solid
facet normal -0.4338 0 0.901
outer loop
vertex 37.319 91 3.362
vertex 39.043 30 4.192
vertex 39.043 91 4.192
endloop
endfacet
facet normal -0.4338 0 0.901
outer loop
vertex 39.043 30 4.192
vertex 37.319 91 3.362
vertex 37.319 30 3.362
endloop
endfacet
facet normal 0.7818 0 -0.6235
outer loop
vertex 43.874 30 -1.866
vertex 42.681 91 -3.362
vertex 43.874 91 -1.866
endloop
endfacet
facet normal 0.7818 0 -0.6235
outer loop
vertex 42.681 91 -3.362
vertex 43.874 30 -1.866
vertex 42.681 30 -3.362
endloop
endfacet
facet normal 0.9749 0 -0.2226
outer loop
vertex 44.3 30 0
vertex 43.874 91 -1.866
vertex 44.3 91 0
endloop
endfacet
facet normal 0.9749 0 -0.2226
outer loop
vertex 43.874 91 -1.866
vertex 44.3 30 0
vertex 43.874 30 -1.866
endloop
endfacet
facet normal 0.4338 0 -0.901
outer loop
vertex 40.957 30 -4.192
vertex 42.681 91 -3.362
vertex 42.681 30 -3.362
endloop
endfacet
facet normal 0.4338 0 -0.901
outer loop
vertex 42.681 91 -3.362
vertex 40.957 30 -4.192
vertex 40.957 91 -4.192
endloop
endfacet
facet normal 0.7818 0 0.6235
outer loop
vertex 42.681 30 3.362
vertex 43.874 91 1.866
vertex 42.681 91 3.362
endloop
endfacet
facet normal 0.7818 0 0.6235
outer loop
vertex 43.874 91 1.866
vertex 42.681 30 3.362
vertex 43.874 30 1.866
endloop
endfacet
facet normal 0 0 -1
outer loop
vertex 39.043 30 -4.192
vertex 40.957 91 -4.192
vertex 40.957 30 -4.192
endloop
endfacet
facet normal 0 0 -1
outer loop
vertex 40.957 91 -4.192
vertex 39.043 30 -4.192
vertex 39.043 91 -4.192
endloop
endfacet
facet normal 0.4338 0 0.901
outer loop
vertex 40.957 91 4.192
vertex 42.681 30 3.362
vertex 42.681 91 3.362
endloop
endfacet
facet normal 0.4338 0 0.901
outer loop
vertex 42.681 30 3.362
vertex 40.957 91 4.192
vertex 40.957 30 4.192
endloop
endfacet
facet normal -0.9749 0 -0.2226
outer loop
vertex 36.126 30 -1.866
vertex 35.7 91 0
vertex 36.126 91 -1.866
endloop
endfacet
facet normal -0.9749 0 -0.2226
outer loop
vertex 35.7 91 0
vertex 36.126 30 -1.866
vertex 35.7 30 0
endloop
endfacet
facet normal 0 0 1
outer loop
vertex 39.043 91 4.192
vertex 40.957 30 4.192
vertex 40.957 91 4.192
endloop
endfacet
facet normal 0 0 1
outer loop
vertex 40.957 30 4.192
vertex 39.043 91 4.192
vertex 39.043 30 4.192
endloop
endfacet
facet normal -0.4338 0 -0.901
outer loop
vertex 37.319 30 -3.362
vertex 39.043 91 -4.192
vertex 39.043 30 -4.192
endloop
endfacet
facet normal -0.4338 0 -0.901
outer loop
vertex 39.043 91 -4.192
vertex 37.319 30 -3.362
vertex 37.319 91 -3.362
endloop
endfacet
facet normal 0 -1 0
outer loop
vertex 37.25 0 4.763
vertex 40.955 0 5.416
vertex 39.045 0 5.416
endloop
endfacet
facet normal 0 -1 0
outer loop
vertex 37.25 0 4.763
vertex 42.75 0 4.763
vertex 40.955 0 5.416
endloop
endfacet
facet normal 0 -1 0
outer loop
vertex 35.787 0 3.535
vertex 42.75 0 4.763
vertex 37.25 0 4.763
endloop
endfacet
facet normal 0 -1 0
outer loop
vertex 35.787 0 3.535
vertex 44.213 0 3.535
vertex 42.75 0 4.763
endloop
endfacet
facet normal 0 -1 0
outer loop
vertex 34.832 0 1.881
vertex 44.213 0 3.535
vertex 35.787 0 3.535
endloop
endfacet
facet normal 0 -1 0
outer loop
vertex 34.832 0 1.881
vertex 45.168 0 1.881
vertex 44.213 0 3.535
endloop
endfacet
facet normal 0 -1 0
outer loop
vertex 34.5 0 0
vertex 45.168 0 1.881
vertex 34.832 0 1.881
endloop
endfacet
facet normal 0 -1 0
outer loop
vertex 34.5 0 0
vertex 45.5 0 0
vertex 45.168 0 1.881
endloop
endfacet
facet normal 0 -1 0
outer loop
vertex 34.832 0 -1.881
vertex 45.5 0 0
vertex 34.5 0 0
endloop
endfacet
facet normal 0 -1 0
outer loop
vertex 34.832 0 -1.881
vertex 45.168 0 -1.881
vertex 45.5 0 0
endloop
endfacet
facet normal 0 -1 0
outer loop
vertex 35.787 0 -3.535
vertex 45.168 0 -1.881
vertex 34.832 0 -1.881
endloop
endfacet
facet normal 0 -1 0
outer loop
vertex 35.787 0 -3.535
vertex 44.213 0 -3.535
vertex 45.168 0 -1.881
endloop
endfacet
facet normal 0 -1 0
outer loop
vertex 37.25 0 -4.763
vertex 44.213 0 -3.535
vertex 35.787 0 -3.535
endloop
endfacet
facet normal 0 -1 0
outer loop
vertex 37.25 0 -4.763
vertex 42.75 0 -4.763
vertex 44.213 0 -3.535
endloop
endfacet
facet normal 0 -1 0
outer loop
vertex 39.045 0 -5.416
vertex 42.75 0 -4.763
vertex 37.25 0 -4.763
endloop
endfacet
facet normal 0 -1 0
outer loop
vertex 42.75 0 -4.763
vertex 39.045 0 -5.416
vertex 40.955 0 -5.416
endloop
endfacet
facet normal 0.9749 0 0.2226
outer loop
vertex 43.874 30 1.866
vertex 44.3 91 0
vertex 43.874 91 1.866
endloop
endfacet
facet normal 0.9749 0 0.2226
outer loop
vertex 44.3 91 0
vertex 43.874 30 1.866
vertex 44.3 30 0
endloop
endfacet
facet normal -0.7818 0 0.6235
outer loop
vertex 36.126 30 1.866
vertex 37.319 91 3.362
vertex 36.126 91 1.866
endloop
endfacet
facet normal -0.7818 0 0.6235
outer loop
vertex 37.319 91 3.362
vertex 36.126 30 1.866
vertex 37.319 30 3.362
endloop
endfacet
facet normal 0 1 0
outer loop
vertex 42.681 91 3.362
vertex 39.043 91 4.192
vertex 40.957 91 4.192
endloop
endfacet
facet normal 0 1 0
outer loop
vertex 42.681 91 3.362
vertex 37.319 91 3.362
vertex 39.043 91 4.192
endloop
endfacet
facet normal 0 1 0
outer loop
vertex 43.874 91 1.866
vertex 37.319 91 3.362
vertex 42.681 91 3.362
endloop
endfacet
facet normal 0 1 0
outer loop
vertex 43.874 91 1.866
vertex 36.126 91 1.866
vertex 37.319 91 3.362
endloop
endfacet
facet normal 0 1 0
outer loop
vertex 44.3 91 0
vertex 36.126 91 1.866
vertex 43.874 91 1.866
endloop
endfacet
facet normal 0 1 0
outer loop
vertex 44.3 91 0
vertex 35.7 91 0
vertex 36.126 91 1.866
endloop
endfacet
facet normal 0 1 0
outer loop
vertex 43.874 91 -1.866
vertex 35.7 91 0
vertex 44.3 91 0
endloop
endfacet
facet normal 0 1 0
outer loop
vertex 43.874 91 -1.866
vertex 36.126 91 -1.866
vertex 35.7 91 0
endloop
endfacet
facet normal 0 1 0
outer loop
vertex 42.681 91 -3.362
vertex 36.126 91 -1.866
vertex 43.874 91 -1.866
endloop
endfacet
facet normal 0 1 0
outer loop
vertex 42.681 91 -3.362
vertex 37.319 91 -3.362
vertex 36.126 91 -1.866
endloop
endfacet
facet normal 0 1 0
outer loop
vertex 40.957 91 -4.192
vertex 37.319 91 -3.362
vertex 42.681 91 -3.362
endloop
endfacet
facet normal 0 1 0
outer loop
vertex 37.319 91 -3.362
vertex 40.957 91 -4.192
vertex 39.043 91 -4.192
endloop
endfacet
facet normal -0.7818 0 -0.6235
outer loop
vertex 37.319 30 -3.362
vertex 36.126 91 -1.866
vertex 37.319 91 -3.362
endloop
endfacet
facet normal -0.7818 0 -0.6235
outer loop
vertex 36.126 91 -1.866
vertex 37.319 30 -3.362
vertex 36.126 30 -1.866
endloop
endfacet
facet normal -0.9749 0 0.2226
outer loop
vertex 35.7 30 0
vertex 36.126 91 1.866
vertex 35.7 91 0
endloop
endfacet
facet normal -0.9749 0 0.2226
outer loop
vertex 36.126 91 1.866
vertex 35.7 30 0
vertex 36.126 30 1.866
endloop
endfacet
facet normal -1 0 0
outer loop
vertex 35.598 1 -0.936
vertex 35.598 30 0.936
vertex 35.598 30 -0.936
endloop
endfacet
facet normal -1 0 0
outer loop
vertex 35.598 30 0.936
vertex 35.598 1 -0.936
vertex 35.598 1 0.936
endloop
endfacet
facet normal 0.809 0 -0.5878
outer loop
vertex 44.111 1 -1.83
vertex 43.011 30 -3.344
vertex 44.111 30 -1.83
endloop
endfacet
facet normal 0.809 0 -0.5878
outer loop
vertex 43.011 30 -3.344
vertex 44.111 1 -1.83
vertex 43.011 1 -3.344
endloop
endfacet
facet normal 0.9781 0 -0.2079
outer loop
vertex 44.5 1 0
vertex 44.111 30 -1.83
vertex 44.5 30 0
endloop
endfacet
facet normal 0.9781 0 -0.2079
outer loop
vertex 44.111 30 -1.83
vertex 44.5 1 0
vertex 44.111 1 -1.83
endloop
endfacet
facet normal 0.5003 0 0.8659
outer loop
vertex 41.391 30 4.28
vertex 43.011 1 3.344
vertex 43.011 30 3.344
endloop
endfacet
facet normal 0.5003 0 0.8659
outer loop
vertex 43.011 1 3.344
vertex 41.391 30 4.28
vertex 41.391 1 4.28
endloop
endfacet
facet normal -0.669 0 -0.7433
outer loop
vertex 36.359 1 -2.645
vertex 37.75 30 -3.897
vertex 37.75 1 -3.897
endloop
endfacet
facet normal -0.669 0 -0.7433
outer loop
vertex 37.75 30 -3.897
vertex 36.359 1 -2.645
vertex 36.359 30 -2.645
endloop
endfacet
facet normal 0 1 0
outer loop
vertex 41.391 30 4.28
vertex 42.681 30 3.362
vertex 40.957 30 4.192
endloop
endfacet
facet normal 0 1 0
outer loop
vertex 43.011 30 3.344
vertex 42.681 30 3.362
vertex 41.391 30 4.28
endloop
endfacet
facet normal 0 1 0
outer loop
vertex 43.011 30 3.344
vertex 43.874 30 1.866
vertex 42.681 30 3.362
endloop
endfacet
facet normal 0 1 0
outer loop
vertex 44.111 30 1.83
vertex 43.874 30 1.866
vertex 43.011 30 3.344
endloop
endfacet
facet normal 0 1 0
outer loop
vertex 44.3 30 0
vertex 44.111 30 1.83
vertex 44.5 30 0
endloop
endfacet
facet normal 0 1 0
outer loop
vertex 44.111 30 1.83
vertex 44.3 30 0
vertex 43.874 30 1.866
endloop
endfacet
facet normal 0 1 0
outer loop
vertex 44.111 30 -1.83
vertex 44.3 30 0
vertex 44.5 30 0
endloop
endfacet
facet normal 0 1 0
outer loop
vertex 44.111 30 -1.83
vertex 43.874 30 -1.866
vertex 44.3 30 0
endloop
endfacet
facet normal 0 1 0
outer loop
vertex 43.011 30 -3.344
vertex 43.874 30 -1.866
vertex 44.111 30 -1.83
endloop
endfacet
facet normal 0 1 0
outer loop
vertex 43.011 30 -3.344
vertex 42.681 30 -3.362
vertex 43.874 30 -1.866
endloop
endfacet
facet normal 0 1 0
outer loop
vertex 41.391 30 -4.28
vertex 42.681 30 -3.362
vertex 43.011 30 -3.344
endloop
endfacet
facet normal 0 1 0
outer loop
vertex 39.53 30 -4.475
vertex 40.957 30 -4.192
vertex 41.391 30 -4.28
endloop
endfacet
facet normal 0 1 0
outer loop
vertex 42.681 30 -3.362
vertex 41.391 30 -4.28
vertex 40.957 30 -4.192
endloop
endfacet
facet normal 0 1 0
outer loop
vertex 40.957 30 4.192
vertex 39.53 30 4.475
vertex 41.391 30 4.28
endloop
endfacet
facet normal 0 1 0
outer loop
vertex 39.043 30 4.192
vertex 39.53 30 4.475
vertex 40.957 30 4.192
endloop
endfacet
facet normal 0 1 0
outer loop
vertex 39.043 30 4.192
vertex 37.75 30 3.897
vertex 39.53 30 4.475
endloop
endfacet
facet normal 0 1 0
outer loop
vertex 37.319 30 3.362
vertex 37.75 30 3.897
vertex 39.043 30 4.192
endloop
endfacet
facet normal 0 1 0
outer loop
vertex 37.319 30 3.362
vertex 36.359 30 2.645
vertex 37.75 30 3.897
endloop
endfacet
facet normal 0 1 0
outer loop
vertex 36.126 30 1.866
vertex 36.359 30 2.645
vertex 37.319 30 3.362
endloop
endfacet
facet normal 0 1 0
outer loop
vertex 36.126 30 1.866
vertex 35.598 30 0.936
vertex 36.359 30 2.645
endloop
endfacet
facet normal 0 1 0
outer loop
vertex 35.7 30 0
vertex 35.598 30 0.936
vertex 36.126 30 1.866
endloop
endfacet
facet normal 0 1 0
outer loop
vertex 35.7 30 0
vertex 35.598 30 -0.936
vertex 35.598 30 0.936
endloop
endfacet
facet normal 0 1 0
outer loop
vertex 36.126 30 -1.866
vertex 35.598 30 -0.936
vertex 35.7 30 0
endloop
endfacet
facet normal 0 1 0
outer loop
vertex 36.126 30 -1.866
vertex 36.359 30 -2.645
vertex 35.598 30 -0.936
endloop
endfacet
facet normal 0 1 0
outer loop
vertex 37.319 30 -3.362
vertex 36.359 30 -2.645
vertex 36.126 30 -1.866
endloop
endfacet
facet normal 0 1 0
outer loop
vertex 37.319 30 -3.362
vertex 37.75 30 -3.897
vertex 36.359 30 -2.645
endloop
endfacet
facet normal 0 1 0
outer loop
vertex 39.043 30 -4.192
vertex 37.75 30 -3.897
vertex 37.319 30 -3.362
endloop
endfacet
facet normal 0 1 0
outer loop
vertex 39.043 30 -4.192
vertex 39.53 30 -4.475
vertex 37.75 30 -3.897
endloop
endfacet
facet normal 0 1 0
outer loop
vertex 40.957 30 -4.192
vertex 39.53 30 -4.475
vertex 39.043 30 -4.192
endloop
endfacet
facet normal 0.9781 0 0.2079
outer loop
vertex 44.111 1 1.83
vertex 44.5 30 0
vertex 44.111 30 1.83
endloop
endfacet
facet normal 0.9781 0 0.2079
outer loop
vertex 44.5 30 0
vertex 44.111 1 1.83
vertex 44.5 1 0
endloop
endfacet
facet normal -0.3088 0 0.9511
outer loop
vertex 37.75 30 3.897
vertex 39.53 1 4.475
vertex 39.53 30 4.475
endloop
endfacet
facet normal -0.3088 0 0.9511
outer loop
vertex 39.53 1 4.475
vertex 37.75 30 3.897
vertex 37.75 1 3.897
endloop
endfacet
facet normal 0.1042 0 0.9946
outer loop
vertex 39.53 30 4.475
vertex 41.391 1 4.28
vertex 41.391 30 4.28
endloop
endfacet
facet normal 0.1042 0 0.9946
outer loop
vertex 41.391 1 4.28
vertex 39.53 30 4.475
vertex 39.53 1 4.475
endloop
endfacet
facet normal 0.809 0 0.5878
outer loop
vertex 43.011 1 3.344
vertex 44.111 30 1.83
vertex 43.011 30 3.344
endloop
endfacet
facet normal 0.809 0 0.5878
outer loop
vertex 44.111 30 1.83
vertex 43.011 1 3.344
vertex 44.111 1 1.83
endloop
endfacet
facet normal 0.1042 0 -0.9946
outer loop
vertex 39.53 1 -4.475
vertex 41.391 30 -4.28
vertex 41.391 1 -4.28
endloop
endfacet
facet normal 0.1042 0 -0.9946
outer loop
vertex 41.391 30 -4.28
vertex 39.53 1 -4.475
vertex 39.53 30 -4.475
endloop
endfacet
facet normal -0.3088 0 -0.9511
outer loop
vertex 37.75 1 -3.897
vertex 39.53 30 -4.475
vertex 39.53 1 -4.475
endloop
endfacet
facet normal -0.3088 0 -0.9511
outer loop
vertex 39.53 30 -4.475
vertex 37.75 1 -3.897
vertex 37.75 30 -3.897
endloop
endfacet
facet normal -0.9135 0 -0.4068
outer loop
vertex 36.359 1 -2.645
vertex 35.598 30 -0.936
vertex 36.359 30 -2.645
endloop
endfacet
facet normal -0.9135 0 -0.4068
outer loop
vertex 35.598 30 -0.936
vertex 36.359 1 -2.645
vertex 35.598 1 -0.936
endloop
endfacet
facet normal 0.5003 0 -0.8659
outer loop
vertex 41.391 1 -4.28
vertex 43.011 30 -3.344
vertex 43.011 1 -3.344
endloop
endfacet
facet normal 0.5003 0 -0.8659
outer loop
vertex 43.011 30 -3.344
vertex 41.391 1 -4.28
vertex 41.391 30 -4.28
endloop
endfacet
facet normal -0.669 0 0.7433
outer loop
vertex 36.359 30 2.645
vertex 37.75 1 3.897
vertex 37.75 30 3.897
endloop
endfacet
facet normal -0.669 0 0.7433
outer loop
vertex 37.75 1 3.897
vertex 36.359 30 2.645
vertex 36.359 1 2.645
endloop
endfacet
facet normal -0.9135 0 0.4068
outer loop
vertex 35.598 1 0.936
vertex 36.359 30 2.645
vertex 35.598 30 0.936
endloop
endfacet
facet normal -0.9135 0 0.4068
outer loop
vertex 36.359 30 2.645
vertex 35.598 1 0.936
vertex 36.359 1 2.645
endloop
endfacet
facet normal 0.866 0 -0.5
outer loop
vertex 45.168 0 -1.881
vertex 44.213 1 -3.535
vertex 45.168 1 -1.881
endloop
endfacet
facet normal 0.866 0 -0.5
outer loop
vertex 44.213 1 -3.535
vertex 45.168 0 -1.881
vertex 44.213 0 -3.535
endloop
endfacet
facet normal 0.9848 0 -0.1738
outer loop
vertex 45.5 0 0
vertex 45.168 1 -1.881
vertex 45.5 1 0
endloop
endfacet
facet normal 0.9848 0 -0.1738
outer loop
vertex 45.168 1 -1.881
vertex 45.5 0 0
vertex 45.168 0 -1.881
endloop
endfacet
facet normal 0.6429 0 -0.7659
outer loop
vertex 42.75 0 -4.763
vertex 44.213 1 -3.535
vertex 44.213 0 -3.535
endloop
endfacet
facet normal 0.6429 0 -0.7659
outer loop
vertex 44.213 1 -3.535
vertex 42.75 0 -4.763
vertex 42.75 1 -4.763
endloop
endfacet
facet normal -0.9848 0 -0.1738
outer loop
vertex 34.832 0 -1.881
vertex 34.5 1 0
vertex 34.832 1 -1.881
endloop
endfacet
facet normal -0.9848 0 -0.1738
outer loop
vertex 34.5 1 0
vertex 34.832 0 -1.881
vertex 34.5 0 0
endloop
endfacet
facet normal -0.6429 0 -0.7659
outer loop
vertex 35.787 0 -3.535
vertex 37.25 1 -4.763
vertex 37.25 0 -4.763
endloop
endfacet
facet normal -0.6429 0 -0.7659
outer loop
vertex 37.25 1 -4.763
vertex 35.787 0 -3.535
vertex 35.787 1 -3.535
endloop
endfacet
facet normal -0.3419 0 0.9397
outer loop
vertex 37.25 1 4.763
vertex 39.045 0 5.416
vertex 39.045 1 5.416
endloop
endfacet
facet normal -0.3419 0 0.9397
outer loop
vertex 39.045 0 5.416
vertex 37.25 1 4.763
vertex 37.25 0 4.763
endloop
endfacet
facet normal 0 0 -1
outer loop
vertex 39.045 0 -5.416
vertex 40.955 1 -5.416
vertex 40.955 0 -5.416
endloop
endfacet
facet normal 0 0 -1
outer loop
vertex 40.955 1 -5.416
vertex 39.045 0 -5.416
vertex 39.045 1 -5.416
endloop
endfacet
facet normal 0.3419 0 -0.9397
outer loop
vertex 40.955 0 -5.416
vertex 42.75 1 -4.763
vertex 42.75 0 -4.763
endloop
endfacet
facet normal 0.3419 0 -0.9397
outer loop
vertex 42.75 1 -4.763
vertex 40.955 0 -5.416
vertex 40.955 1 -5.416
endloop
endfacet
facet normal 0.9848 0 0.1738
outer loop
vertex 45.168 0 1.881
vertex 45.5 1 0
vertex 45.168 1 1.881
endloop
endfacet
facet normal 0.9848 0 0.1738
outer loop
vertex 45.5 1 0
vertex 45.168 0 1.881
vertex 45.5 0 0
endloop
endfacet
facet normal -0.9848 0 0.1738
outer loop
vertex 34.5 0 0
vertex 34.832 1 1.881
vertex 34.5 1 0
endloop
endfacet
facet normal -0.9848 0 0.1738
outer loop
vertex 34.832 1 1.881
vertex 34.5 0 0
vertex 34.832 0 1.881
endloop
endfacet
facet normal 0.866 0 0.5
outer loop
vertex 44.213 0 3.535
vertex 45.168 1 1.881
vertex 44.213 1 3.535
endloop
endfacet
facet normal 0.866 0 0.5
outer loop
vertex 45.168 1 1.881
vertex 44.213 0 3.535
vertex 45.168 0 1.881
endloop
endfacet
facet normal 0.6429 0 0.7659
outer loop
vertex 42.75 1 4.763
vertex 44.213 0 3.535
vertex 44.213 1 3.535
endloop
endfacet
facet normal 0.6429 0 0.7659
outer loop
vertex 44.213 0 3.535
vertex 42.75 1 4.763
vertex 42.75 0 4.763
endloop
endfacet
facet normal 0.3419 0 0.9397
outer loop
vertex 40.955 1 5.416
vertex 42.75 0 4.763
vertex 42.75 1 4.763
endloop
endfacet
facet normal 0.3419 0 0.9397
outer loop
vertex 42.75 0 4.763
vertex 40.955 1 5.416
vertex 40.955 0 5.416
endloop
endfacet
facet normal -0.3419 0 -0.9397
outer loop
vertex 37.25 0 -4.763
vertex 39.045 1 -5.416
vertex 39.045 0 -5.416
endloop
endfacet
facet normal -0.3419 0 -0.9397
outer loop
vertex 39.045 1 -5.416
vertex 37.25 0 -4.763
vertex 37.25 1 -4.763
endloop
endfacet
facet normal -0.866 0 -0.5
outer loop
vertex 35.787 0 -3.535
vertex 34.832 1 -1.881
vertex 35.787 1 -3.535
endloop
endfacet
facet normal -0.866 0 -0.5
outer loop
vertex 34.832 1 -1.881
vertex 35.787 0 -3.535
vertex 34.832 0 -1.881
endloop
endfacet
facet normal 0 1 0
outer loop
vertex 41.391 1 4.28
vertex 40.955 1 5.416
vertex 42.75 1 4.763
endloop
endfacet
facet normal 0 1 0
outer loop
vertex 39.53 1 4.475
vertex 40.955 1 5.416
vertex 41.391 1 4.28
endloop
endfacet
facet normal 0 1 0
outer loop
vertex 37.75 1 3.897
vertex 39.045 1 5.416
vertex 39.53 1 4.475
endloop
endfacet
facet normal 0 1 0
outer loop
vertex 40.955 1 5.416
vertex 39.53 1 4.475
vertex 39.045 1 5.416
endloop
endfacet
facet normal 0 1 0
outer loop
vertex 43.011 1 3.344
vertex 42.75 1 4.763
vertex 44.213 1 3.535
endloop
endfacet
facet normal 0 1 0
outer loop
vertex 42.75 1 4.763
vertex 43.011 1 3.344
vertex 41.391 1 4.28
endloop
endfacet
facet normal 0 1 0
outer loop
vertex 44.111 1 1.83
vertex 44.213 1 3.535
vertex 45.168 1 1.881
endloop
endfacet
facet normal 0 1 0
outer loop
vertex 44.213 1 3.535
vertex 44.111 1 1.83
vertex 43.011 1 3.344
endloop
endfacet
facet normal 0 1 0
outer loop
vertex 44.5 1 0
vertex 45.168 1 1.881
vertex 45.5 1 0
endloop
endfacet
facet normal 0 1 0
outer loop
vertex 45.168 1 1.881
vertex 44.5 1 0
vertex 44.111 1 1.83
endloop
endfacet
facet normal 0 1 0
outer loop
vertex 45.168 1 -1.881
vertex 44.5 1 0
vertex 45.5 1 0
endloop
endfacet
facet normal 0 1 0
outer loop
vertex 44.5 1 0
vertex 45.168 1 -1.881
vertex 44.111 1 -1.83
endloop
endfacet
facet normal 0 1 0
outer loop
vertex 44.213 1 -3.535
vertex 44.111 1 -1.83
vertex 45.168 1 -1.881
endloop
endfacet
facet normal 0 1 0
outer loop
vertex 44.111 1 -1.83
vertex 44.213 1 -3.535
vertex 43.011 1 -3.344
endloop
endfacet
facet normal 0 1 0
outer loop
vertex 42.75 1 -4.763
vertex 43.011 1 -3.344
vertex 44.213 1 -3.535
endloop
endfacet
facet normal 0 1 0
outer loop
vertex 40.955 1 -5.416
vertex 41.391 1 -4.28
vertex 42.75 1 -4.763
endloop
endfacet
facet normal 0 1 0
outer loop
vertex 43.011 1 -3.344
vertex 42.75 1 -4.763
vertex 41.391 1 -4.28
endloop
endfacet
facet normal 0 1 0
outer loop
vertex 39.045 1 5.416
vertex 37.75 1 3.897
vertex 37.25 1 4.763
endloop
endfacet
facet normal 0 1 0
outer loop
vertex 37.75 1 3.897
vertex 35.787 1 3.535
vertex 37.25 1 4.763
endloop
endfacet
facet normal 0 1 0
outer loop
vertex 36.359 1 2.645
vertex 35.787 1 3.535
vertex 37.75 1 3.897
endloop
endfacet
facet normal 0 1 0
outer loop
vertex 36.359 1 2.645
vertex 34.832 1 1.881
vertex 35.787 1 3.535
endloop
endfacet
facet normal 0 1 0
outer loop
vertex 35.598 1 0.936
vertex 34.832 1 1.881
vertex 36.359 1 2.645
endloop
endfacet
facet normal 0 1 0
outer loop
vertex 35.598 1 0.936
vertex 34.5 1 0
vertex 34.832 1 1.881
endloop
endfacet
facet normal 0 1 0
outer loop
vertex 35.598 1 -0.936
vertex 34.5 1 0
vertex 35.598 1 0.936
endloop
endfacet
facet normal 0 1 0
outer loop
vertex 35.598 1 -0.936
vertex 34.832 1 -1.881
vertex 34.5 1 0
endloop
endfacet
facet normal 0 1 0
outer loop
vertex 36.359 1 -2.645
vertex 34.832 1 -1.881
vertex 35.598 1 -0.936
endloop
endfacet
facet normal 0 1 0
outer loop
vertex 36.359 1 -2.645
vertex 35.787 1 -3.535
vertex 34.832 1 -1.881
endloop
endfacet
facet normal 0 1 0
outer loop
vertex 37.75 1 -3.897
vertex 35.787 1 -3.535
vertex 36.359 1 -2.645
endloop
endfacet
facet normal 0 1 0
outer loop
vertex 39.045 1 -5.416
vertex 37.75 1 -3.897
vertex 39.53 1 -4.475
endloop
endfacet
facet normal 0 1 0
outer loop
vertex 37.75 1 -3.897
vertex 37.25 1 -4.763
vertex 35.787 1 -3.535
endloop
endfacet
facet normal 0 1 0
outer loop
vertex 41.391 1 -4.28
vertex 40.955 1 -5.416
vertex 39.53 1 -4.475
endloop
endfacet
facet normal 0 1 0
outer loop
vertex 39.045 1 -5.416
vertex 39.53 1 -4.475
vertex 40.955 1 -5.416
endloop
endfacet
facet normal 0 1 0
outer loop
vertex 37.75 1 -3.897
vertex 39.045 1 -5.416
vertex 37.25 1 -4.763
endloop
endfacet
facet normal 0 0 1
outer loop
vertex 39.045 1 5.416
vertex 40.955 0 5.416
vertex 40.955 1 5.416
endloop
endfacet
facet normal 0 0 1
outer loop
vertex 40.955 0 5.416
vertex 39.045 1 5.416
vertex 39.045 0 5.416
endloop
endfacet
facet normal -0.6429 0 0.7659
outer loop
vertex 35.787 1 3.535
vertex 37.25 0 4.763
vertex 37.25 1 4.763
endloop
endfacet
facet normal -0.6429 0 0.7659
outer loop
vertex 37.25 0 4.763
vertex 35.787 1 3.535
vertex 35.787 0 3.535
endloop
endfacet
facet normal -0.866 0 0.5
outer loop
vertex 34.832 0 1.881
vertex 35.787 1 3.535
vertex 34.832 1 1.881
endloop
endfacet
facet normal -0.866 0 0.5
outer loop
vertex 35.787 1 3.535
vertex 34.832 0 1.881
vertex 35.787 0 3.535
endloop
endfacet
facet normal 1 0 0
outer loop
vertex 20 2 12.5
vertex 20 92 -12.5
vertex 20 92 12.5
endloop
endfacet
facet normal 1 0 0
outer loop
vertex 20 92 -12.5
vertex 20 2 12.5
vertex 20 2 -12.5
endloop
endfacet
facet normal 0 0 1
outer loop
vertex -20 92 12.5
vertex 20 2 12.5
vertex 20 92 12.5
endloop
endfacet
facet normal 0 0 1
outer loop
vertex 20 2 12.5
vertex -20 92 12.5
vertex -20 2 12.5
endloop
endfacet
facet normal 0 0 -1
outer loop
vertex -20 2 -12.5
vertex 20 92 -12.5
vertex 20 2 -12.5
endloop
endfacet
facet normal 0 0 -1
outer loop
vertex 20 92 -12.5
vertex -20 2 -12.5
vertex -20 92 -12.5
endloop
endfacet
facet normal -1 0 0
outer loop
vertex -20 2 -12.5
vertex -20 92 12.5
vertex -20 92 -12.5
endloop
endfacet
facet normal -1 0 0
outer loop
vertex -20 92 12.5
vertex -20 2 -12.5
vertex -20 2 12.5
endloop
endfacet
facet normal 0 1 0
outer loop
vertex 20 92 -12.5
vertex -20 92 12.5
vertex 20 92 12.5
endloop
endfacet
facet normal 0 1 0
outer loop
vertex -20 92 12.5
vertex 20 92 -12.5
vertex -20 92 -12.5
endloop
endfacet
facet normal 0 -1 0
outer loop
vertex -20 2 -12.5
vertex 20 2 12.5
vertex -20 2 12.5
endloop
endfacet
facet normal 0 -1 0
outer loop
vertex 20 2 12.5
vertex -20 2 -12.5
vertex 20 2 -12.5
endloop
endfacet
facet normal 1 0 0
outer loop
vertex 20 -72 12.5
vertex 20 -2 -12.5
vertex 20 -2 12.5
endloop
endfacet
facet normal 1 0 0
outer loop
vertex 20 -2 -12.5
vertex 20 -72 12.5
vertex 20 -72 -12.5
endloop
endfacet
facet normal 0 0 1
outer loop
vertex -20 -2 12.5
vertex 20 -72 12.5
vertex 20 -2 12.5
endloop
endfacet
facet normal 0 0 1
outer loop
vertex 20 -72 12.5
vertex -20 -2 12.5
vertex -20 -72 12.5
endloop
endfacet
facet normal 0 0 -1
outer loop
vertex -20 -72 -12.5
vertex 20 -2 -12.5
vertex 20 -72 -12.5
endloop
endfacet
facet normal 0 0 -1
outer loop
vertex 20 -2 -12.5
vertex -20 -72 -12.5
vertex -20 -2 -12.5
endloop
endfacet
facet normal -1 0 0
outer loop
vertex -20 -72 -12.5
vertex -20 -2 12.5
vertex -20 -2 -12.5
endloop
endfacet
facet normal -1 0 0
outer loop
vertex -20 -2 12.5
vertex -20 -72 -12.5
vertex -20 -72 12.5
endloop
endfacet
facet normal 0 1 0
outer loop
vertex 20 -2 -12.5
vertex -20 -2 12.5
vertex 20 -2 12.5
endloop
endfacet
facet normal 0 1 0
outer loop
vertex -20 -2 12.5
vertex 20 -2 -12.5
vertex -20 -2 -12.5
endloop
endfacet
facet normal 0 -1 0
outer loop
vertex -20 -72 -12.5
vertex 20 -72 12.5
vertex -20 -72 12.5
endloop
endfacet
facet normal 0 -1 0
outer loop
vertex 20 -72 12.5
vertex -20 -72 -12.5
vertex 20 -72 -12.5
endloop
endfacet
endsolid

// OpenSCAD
dia_rim = 11;
dia_casing = 9;
dia_bore = 8.6;
length_casing = 30;
length_bore = 90;
length_rim = 1;

translate([0, 47, 0]){
	cube(size=[40, length_bore, 25], center=true);
}
translate([0, -37, 0]) {
	cube(size=[40, 70, 25], center=true);
}

translate([40, 0, 0]) {
	rotate([-90, 0, 0]) {
		cylinder(d=dia_bore, h=length_bore+1);
		cylinder(d=dia_casing, h=length_casing);
		cylinder(d=dia_rim, h=length_rim);
	}
}
